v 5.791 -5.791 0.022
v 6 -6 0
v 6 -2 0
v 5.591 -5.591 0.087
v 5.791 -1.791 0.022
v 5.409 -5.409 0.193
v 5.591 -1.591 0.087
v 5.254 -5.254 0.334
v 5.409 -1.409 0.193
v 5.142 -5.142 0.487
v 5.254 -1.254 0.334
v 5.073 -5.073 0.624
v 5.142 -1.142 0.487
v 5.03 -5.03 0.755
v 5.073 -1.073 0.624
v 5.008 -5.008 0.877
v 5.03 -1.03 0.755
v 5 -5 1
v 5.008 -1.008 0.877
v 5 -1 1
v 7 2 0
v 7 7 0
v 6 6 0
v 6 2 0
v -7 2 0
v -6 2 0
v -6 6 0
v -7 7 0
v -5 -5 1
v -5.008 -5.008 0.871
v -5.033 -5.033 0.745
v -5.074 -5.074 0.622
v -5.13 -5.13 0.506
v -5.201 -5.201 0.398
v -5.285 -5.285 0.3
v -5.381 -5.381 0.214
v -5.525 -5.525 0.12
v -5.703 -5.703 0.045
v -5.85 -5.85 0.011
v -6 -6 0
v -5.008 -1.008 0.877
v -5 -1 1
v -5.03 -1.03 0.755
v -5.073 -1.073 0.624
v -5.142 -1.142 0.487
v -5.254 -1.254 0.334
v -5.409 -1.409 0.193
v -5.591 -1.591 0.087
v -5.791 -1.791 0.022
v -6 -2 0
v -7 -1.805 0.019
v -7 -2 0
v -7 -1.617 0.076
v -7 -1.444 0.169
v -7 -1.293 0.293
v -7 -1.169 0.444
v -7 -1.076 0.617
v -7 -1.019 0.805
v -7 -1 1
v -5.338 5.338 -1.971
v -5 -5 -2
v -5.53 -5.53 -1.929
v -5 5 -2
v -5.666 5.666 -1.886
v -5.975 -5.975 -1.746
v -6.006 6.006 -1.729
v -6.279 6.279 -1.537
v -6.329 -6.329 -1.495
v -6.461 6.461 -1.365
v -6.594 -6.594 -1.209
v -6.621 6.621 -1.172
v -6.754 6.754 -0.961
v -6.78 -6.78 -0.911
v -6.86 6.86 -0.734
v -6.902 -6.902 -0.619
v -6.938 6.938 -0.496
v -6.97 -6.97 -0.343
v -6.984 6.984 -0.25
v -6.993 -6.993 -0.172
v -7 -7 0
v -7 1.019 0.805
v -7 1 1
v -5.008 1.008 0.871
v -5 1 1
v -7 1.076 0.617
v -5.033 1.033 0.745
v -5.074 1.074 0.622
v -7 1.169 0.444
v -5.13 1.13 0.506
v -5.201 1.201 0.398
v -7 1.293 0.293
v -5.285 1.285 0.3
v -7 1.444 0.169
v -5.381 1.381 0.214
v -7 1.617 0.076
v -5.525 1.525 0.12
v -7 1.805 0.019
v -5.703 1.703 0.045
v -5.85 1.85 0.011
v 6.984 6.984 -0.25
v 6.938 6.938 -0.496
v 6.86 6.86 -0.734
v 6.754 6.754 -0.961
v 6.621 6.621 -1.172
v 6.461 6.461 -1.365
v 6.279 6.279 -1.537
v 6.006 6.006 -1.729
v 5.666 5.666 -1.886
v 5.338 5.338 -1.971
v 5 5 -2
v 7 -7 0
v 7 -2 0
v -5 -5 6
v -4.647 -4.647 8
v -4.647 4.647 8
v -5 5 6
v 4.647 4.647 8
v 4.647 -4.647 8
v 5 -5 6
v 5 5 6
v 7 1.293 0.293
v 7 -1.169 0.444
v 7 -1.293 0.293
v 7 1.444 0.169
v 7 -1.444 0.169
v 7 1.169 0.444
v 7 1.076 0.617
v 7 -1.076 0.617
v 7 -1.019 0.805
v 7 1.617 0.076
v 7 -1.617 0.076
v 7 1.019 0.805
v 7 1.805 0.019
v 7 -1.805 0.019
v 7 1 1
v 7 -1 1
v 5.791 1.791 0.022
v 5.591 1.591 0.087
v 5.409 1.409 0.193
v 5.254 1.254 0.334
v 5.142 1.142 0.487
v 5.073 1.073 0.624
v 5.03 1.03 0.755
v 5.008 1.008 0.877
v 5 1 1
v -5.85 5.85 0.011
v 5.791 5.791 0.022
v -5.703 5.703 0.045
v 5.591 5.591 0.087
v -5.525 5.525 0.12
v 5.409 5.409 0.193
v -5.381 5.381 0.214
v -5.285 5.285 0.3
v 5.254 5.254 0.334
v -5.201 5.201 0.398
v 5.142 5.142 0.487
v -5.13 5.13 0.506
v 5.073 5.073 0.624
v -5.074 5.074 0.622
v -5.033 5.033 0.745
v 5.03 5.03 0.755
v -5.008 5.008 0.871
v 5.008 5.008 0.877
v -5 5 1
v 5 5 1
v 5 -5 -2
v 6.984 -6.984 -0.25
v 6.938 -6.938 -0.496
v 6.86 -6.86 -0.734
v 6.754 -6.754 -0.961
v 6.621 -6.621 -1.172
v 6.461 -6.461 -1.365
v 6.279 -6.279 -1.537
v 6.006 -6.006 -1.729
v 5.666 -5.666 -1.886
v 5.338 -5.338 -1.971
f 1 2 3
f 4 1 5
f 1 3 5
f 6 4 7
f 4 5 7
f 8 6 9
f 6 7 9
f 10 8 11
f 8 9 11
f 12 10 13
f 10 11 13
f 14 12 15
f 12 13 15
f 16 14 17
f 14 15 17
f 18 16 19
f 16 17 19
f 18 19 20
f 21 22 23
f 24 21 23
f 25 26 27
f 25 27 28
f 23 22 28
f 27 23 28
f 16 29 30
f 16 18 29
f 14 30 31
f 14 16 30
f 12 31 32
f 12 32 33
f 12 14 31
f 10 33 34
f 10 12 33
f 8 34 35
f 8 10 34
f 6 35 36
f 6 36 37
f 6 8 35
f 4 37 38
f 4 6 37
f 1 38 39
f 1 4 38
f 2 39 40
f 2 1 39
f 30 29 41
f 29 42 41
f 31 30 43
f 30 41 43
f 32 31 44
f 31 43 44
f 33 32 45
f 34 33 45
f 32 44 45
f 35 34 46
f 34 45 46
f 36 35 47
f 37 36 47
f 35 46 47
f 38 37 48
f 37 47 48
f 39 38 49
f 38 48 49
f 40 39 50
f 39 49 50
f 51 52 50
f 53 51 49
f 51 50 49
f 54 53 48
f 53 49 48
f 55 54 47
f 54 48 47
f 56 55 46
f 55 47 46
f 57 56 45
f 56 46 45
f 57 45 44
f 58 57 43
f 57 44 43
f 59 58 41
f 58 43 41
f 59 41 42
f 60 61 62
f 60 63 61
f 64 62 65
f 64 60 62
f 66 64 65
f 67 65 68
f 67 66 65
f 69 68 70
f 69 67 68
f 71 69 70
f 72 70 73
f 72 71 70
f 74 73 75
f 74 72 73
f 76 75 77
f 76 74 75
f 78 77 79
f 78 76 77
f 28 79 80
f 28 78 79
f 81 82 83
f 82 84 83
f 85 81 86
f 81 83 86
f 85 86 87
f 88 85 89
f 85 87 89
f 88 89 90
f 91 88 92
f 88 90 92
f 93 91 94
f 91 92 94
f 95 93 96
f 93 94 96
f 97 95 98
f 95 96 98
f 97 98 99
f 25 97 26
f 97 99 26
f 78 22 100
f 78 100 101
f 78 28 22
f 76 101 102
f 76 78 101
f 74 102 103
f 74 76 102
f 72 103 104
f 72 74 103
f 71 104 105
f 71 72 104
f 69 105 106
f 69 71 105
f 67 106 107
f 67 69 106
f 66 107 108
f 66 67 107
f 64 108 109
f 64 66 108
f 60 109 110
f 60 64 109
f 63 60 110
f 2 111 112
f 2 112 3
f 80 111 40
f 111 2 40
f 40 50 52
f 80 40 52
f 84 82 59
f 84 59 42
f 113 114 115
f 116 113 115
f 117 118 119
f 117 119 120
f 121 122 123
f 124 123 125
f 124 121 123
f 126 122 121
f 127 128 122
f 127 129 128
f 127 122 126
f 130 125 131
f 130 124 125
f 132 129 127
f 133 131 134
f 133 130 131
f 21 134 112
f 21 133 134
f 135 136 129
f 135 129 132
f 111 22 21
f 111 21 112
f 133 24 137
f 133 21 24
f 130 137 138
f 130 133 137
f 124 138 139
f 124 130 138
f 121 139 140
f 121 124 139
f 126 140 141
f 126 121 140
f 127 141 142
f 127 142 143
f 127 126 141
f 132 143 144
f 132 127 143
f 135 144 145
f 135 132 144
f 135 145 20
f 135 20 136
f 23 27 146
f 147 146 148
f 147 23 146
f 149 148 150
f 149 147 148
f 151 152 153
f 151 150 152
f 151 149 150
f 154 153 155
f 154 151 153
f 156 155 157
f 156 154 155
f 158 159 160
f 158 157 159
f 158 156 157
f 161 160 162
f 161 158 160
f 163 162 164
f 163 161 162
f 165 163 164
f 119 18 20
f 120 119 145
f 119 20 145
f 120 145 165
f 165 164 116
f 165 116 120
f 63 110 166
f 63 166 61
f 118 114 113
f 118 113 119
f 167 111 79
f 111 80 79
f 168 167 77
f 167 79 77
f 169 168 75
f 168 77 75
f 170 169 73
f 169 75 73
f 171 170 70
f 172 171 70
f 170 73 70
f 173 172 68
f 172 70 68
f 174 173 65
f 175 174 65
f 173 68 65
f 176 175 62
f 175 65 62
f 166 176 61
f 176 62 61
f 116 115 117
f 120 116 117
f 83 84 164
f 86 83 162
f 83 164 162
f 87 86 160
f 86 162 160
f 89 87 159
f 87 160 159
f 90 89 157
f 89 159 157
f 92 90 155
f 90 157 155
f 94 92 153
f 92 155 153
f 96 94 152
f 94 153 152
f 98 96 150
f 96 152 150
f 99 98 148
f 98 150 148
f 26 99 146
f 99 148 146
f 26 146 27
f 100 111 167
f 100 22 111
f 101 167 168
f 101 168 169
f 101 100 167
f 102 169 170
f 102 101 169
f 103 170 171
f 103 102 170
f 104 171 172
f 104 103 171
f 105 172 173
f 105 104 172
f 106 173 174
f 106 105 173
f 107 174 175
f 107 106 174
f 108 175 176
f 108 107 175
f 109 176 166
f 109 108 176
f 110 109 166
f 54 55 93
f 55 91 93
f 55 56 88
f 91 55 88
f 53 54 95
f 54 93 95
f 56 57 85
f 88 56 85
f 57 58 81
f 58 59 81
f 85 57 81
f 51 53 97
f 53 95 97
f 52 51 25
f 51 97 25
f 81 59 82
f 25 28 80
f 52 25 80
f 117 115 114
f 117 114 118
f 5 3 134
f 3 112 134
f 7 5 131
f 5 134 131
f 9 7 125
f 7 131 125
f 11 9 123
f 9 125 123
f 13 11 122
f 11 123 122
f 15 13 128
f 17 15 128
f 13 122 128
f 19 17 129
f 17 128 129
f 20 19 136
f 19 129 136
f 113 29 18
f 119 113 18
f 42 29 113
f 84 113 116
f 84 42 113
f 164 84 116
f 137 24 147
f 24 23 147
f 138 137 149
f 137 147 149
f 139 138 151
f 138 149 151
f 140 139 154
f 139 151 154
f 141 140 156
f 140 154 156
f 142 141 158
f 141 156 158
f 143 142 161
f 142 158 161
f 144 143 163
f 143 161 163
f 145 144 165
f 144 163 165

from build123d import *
from OCP.BRepFilletAPI import BRepFilletAPI_MakeChamfer

# Parameters (mm, degrees)
SKETCH1_W           = 10
SKETCH1_H           = 10
BOSS_EXTRUDE1_DEPTH = 8
SKETCH2_W           = 14
SKETCH2_H           = 14
BOSS_EXTRUDE2_DEPTH = 2
FILLET1_R           = 2
CHAMFER1_SIZE       = 2
CHAMFER1_SIZE2      = 0.352653961
SKETCH3_W           = 2
SKETCH3_H           = 2
BOSS_EXTRUDE3_DEPTH = 1
FILLET2_R           = 1


with BuildPart() as part:
    # Sketch1 → Boss-Extrude1 (new body)
    with BuildSketch(Plane.XY):
        Rectangle(SKETCH1_W, SKETCH1_H)
    extrude(amount=BOSS_EXTRUDE1_DEPTH)

    # Sketch2 → Boss-Extrude2 (add)
    with BuildSketch(Plane(origin=(0, 0, 0), x_dir=(-1, 0, 0), z_dir=(0, 0, -1))):
        Rectangle(SKETCH2_W, SKETCH2_H)
    extrude(amount=BOSS_EXTRUDE2_DEPTH)

    # Fillet1
    fillet1_edges = [part.edges().sort_by_distance(p)[0] for p in [
        (0, 7, -2),
        (-7, 0, -2),
        (0, -7, -2),
        (7, 0, -2),
    ]]
    fillet(fillet1_edges, radius=FILLET1_R - 0.0001)  # a hair under: the kernel refuses the full size

    # Chamfer1: one chamfer whose edges measure the first distance from different faces: ONE call of the kernel's chamfer builder (chamfer() names one face for all edges)
    chamfer1_edges_1 = [part.edges().sort_by_distance(p)[0] for p in [
        (5, 0, 8),
    ]]
    chamfer1_side_1 = [part.faces().sort_by_distance(p)[0] for p in [
        (5, 0, 4),
    ]]
    chamfer1_edges_2 = [part.edges().sort_by_distance(p)[0] for p in [
        (0, 5, 8),
    ]]
    chamfer1_side_2 = [part.faces().sort_by_distance(p)[0] for p in [
        (0, 5, 4),
    ]]
    chamfer1_edges_3 = [part.edges().sort_by_distance(p)[0] for p in [
        (-5, 0, 8),
    ]]
    chamfer1_side_3 = [part.faces().sort_by_distance(p)[0] for p in [
        (-5, 0, 4),
    ]]
    chamfer1_edges_4 = [part.edges().sort_by_distance(p)[0] for p in [
        (0, -5, 8),
    ]]
    chamfer1_side_4 = [part.faces().sort_by_distance(p)[0] for p in [
        (0, -5, 4),
    ]]
    chamfer1 = BRepFilletAPI_MakeChamfer(part.part.solid().wrapped)
    for e in chamfer1_edges_1:
        chamfer1.Add(CHAMFER1_SIZE, CHAMFER1_SIZE2, e.wrapped, chamfer1_side_1[0].wrapped)  # the first distance lies on this face
    for e in chamfer1_edges_2:
        chamfer1.Add(CHAMFER1_SIZE, CHAMFER1_SIZE2, e.wrapped, chamfer1_side_2[0].wrapped)  # the first distance lies on this face
    for e in chamfer1_edges_3:
        chamfer1.Add(CHAMFER1_SIZE, CHAMFER1_SIZE2, e.wrapped, chamfer1_side_3[0].wrapped)  # the first distance lies on this face
    for e in chamfer1_edges_4:
        chamfer1.Add(CHAMFER1_SIZE, CHAMFER1_SIZE2, e.wrapped, chamfer1_side_4[0].wrapped)  # the first distance lies on this face
    add(Compound.cast(chamfer1.Shape()), mode=Mode.REPLACE)

    # Sketch3 → Boss-Extrude3 (add)
    with BuildSketch(Plane.XY):
        with Locations((-6, 0)):
            Rectangle(SKETCH3_W, SKETCH3_H)
        with Locations((6, 0)):
            Rectangle(SKETCH3_W, SKETCH3_H)
    extrude(amount=BOSS_EXTRUDE3_DEPTH)

    # Fillet2
    fillet2_edges = [part.edges().sort_by_distance(p)[0] for p in [
        (6, 1, 0),
        (6, -1, 0),
        (-6, -1, 0),
        (-6, 1, 0),
        (5, 3, 0),
        (5, -3, 0),
        (-5, 3, 0),
        (-5, -3, 0),
        (0, 5, 0),
        (0, -5, 0),
    ]]
    fillet(fillet2_edges, radius=FILLET2_R - 0.0001)  # a hair under: the kernel refuses the full size


solid = part.part
